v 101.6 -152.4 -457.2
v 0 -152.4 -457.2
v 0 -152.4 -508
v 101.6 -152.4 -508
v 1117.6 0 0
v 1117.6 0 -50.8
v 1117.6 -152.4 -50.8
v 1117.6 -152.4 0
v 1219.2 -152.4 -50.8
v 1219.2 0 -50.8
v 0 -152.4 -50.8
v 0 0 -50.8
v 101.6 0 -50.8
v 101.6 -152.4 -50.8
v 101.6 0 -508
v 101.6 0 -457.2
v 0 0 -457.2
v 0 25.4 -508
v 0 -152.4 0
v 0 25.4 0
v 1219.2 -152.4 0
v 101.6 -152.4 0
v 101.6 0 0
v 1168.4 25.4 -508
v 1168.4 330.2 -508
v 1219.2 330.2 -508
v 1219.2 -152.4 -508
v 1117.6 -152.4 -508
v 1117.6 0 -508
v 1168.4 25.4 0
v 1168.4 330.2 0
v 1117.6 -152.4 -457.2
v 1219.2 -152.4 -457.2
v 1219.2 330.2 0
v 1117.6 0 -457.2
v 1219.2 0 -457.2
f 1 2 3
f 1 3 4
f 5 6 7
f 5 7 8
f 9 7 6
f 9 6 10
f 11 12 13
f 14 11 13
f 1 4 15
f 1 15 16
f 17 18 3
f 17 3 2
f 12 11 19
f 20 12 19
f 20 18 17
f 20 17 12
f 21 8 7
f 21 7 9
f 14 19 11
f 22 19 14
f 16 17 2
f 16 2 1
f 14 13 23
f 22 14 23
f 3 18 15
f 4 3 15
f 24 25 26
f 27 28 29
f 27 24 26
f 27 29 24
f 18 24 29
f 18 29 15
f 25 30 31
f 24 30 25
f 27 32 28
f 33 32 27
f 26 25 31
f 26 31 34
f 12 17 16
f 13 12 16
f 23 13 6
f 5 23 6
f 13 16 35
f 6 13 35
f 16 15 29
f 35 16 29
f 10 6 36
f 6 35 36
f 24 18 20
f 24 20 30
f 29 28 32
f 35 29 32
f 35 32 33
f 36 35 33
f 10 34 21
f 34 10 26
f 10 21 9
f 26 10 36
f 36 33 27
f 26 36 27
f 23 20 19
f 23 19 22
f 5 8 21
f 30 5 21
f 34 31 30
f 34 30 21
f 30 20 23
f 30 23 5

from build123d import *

# Parameters (mm, degrees)
SKETCH1_W           = 1219.2
SKETCH1_H           = 508
BOSS_EXTRUDE1_DEPTH = 25.4
SKETCH2_W           = 50.8
SKETCH2_H           = 508
BOSS_EXTRUDE2_DEPTH = 304.8
SKETCH3_W           = 101.6
SKETCH3_H           = 50.8
BOSS_EXTRUDE3_DEPTH = 152.4


with BuildPart() as part:
    # Sketch1 → Boss-Extrude1 (new body)
    with BuildSketch(Plane(origin=(0, 0, 0), x_dir=(1, 0, 0), z_dir=(0, 1, 0))):
        with Locations((609.6, 254)):
            Rectangle(SKETCH1_W, SKETCH1_H)
    extrude(amount=BOSS_EXTRUDE1_DEPTH)

    # Sketch2 → Boss-Extrude2 (add)
    with BuildSketch(Plane(origin=(0, 25.4, 0), x_dir=(1, 0, 0), z_dir=(0, 1, 0))):
        with Locations((1193.8, 254)):
            Rectangle(SKETCH2_W, SKETCH2_H)
    extrude(amount=BOSS_EXTRUDE2_DEPTH)

    # Sketch3 → Boss-Extrude3 (add)
    with BuildSketch(Plane.XZ):
        with Locations((50.8, -25.4)):
            Rectangle(SKETCH3_W, SKETCH3_H)
        with Locations((50.8, -482.6)):
            Rectangle(SKETCH3_W, SKETCH3_H)
        with Locations((1168.4, -25.4)):
            Rectangle(SKETCH3_W, SKETCH3_H)
        with Locations((1168.4, -482.6)):
            Rectangle(SKETCH3_W, SKETCH3_H)
    extrude(amount=BOSS_EXTRUDE3_DEPTH)


solid = part.part
